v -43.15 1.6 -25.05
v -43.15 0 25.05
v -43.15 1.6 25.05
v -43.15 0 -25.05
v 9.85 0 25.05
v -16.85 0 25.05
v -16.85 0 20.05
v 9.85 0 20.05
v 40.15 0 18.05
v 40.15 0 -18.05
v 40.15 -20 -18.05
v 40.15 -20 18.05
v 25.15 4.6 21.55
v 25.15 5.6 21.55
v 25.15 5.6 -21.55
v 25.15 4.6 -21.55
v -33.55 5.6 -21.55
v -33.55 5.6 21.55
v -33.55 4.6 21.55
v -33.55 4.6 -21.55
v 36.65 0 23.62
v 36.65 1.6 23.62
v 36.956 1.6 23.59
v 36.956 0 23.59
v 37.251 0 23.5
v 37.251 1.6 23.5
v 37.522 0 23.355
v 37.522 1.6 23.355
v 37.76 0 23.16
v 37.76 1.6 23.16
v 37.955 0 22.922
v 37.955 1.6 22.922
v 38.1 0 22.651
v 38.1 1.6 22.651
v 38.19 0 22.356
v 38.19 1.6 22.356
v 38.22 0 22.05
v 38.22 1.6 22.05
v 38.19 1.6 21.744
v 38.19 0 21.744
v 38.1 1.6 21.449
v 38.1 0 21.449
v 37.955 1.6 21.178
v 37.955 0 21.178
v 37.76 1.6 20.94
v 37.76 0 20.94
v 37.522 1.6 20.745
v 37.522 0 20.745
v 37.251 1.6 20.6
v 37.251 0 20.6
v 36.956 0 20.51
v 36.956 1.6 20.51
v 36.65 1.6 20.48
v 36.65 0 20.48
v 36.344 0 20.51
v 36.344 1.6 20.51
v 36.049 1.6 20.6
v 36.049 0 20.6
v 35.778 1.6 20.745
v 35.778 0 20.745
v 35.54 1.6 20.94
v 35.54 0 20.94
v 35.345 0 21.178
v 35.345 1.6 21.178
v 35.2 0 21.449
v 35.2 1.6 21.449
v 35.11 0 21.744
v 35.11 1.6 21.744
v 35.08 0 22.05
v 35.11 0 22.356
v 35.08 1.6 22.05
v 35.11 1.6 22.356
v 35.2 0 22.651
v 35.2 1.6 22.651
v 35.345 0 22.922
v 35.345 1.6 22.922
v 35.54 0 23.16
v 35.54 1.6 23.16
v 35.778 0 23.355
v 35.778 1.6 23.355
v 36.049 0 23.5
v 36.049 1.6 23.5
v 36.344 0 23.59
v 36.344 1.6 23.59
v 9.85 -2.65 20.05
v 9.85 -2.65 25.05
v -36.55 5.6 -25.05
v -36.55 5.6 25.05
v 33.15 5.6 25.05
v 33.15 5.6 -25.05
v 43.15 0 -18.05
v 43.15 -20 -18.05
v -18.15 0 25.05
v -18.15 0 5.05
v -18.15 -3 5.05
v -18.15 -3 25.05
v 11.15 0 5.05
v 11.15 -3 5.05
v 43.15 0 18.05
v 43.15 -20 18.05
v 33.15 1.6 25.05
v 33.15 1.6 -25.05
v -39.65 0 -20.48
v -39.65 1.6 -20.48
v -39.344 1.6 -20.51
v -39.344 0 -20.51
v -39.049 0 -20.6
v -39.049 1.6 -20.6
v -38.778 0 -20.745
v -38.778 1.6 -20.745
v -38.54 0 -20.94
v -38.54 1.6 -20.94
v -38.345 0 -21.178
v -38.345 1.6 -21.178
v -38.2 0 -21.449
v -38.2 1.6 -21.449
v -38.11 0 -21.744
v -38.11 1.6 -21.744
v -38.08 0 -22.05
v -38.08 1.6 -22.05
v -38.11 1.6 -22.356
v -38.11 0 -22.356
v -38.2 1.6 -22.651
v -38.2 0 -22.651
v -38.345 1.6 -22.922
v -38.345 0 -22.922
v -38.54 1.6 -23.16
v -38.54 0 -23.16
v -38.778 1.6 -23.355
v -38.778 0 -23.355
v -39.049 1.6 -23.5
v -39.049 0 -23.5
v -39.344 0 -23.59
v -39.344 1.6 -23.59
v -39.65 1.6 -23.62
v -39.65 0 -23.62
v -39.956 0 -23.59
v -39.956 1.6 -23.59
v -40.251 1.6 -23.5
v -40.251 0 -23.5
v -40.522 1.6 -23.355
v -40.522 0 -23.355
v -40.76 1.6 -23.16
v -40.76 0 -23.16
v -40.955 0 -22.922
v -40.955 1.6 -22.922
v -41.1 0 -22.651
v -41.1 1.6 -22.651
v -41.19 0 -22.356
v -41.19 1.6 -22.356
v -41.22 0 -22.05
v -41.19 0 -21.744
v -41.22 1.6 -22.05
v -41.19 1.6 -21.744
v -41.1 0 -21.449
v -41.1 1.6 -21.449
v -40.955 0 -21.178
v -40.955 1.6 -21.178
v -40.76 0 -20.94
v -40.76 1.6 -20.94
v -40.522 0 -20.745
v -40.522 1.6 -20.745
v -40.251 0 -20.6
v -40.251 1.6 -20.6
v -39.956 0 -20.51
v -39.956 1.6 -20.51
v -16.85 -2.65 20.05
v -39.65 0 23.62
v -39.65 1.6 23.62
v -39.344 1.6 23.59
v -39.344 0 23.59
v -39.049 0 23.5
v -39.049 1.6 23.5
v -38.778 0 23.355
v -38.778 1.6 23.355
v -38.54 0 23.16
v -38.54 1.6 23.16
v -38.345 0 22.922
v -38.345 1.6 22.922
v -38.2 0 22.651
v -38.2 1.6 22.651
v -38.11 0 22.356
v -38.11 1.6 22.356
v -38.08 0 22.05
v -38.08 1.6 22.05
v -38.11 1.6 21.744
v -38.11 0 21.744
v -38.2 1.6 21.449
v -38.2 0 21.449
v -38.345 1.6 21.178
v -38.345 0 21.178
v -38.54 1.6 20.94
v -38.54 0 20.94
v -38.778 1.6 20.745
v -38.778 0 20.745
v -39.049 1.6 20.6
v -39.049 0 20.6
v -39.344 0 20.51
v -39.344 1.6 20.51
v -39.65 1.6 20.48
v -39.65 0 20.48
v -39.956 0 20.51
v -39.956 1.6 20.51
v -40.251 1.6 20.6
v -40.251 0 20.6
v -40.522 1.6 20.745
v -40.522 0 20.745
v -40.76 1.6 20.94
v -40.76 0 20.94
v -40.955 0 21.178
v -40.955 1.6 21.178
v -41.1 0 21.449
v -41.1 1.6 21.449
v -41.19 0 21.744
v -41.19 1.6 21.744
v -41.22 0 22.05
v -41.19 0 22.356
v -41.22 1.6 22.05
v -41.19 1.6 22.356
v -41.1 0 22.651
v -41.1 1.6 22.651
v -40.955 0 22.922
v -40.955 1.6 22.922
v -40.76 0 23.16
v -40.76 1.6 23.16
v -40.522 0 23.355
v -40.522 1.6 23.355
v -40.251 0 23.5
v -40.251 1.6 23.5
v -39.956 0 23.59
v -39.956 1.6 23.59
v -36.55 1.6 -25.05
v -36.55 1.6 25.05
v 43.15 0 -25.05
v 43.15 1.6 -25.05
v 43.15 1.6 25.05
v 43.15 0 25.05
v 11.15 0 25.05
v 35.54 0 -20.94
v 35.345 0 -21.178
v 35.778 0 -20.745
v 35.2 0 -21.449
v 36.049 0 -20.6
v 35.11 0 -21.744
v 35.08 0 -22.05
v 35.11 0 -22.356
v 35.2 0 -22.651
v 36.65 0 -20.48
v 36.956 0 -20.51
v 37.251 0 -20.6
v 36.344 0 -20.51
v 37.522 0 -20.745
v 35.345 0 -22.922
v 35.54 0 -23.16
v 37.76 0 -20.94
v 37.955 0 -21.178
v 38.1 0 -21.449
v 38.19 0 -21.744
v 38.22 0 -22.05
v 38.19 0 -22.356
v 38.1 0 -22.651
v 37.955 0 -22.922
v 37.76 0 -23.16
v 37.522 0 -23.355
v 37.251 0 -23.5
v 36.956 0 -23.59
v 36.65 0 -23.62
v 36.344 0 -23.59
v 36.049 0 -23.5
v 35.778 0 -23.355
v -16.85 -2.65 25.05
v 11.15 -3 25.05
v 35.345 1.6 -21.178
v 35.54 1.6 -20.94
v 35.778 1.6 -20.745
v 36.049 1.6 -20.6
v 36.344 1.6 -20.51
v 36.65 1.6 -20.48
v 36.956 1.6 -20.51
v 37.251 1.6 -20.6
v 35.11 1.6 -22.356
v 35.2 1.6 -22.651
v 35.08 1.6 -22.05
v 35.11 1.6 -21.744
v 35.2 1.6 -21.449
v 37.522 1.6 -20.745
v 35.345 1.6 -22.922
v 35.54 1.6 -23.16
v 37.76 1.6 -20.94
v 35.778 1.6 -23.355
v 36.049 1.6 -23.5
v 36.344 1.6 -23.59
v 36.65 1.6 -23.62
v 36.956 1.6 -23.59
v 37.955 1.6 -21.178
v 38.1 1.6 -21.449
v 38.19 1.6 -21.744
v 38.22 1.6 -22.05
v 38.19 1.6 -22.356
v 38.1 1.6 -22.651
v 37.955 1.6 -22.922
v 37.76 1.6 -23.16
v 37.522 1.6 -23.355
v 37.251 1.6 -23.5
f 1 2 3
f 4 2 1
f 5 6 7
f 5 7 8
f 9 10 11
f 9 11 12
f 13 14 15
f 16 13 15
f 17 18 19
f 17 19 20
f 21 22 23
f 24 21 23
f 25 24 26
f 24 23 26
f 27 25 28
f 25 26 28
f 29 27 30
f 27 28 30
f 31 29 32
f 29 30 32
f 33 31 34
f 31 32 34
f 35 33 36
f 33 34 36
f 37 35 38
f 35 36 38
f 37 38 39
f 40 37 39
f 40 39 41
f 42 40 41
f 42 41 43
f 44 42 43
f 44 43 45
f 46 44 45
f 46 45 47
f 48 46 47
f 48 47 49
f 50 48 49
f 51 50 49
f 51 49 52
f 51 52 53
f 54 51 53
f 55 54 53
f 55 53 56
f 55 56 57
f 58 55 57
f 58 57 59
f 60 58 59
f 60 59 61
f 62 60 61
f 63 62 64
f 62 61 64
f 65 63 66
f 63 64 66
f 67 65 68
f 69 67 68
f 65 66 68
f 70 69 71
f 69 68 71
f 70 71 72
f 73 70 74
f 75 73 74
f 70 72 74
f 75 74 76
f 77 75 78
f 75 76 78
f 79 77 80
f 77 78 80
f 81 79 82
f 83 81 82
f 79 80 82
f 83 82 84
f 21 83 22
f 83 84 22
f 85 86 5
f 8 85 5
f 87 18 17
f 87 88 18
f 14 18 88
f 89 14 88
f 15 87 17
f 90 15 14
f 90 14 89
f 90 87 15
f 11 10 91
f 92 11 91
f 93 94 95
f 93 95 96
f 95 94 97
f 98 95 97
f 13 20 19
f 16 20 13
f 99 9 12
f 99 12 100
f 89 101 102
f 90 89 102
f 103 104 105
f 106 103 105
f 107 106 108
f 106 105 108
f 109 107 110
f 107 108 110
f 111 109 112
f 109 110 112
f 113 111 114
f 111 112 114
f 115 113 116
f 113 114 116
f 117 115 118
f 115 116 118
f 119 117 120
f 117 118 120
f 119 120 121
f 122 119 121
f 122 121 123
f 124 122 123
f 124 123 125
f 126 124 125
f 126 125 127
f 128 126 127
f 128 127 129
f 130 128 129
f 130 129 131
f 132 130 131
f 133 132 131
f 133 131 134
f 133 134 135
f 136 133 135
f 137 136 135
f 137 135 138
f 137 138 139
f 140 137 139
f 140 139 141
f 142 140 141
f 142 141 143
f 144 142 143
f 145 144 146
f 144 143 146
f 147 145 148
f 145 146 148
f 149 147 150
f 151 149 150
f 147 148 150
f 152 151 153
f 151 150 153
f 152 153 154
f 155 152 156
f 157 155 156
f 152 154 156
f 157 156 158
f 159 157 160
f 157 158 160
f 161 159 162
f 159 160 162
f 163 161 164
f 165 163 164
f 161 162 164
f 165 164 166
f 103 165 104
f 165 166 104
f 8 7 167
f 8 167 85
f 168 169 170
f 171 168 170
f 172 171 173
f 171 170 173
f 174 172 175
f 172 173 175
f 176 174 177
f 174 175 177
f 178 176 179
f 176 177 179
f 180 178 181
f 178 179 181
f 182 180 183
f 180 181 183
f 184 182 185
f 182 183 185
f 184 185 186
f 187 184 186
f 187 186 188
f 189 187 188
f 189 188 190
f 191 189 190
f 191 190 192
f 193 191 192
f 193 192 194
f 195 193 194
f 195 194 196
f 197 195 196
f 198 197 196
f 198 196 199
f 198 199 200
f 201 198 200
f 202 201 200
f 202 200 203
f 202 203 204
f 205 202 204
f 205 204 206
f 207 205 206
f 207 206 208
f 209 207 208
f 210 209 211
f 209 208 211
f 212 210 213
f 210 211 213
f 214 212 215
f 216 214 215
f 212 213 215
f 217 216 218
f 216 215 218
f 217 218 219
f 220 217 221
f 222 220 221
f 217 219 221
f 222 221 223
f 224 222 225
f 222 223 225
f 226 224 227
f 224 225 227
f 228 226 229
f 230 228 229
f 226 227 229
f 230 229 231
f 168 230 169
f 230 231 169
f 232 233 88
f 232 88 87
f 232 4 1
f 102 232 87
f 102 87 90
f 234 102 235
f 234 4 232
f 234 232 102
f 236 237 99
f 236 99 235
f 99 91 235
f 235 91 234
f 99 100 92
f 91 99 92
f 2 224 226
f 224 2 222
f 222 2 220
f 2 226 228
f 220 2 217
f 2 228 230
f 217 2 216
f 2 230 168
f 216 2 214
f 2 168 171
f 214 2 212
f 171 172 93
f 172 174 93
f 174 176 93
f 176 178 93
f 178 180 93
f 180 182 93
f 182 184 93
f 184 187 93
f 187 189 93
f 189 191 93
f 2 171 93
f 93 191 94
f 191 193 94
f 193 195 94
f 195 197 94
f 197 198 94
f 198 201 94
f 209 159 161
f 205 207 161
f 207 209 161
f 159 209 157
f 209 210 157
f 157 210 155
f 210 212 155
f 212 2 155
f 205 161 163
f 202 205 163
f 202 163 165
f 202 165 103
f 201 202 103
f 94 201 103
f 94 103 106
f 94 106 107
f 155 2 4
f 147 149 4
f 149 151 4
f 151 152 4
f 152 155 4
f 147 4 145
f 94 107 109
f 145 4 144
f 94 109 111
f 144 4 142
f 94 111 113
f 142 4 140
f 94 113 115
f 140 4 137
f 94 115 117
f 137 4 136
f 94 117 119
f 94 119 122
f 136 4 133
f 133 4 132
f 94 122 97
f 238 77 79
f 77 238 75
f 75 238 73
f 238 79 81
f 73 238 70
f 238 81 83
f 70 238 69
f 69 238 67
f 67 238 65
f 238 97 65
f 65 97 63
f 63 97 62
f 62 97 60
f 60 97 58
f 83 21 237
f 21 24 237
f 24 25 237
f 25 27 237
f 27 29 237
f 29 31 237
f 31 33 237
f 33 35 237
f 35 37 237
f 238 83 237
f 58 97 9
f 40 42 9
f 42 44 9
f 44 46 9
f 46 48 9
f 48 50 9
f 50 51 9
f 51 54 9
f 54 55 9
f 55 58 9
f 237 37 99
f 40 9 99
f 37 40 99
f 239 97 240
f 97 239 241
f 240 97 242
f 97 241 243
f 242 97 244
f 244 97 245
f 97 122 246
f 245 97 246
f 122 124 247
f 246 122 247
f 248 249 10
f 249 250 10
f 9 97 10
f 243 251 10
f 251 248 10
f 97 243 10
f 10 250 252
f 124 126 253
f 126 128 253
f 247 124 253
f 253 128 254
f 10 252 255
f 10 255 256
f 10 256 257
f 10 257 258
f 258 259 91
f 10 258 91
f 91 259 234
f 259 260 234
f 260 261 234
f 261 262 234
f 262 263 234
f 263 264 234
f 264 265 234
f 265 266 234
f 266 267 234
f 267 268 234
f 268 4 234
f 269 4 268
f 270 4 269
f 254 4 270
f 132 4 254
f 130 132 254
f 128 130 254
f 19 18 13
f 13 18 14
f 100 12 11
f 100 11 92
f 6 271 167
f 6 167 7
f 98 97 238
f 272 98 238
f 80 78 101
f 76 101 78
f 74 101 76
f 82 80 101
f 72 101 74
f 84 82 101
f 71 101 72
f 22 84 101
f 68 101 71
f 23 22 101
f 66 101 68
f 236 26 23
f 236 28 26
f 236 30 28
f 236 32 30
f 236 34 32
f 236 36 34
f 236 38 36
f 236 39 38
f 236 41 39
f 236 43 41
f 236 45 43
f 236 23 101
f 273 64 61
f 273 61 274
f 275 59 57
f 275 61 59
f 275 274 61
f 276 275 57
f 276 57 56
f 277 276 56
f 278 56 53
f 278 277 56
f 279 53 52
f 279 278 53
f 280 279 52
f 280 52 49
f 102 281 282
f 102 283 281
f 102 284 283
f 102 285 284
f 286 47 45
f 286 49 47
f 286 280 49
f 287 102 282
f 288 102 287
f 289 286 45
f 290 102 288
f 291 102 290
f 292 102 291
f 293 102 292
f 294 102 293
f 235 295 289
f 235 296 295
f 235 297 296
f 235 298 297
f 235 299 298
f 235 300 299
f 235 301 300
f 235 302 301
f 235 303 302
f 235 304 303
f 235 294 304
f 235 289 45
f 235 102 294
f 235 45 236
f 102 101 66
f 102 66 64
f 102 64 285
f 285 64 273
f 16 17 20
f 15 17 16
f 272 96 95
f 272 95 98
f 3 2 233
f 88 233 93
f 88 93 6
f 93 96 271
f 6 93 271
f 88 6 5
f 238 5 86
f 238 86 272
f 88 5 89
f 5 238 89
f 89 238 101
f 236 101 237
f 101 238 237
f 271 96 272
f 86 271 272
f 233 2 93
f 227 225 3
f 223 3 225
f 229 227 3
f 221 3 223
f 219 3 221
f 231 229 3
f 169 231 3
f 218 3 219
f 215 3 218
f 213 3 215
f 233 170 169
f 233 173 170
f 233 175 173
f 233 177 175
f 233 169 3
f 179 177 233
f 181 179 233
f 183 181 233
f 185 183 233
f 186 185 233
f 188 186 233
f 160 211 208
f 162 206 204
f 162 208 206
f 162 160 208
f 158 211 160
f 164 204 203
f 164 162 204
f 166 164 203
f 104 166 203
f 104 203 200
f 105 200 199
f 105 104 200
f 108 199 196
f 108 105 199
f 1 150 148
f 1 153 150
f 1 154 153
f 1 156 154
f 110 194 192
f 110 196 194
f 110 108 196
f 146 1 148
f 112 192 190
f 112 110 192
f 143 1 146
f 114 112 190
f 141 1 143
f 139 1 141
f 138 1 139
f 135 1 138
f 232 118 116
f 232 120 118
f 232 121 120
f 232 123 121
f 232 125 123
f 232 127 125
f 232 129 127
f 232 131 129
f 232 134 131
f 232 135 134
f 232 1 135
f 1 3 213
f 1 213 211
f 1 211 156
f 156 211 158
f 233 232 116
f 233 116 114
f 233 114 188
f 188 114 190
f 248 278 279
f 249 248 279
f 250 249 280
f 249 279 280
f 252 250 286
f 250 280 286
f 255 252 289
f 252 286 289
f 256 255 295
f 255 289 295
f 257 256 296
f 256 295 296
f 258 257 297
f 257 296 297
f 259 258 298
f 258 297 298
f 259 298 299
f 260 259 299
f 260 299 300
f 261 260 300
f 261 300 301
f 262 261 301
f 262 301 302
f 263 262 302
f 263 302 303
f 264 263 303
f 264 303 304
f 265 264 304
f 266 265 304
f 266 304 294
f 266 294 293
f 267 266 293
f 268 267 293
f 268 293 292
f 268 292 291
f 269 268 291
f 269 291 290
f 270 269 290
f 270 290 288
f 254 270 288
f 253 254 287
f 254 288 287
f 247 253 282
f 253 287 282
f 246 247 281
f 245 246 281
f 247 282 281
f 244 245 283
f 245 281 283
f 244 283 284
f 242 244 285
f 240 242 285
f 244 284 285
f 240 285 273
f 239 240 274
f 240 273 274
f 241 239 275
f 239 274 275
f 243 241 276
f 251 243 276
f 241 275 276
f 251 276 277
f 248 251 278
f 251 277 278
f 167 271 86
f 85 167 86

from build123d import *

# Parameters (mm, degrees)
SKETCH1_W          = 86.3
SKETCH1_H          = 50.1
CIRCUIT_DEPTH      = 1.6
SKETCH2_R          = 1.57
SCREW_HOLES_DEPTH  = 50.919785657
SKETCH3_W          = 69.7
SKETCH3_H          = 50.1
LCD_DEPTH          = 4
SKETCH4_W          = 3
SKETCH4_H          = 36.1
PINS_DEPTH         = 20
SKETCH6_W          = 29.3
SKETCH6_H          = 20
SD_SLOT_DEPTH      = 3
SKETCH8_W          = 26.7
SKETCH8_H          = 2.65
CUT_EXTRUDE2_DEPTH = 5
SKETCH9_W          = 58.7
SKETCH9_H          = 43.1
CUT_EXTRUDE3_DEPTH = 1


with BuildPart() as part:
    # Sketch1 → CIRCUIT (new body)
    with BuildSketch(Plane(origin=(0, 0, 0), x_dir=(1, 0, 0), z_dir=(0, 1, 0))):
        Rectangle(SKETCH1_W, SKETCH1_H)
    extrude(amount=CIRCUIT_DEPTH)

    # Sketch2 → SCREW_HOLES (cut, through all)
    with BuildSketch(Plane(origin=(0, 1.6, 0), x_dir=(1, 0, 0), z_dir=(0, 1, 0))):
        with Locations(Location((-39.65, 22.05, 0), (0, 0, 270))):
            Circle(SKETCH2_R)
        with Locations(Location((-39.65, -22.05, 0), (0, 0, 270))):
            Circle(SKETCH2_R)
        with Locations(Location((36.65, 22.05, 0), (0, 0, 270))):
            Circle(SKETCH2_R)
        with Locations(Location((36.65, -22.05, 0), (0, 0, 270))):
            Circle(SKETCH2_R)
    extrude(amount=-SCREW_HOLES_DEPTH, mode=Mode.SUBTRACT)

    # Sketch3 → LCD (add)
    with BuildSketch(Plane(origin=(0, 1.6, 0), x_dir=(1, 0, 0), z_dir=(0, 1, 0))):
        with Locations((-1.7, 0)):
            Rectangle(SKETCH3_W, SKETCH3_H)
    extrude(amount=LCD_DEPTH)

    # Sketch4 → PINS (add)
    with BuildSketch(Plane.XZ):
        with Locations((41.65, 0)):
            Rectangle(SKETCH4_W, SKETCH4_H)
    extrude(amount=PINS_DEPTH)

    # Sketch6 → SD_SLOT (add)
    with BuildSketch(Plane.XZ):
        with Locations((-3.5, 15.05)):
            Rectangle(SKETCH6_W, SKETCH6_H)
    extrude(amount=SD_SLOT_DEPTH)

    # Sketch8 → Cut-Extrude2 (cut)
    with BuildSketch(Plane.XY.offset(25.05)):
        with Locations((-3.5, -1.325)):
            Rectangle(SKETCH8_W, SKETCH8_H)
    extrude(amount=-CUT_EXTRUDE2_DEPTH, mode=Mode.SUBTRACT)

    # Sketch9 → Cut-Extrude3 (cut)
    with BuildSketch(Plane(origin=(0, 5.6, 0), x_dir=(1, 0, 0), z_dir=(0, 1, 0))):
        with Locations((-4.2, 0)):
            Rectangle(SKETCH9_W, SKETCH9_H)
    extrude(amount=-CUT_EXTRUDE3_DEPTH, mode=Mode.SUBTRACT)


solid = part.part
